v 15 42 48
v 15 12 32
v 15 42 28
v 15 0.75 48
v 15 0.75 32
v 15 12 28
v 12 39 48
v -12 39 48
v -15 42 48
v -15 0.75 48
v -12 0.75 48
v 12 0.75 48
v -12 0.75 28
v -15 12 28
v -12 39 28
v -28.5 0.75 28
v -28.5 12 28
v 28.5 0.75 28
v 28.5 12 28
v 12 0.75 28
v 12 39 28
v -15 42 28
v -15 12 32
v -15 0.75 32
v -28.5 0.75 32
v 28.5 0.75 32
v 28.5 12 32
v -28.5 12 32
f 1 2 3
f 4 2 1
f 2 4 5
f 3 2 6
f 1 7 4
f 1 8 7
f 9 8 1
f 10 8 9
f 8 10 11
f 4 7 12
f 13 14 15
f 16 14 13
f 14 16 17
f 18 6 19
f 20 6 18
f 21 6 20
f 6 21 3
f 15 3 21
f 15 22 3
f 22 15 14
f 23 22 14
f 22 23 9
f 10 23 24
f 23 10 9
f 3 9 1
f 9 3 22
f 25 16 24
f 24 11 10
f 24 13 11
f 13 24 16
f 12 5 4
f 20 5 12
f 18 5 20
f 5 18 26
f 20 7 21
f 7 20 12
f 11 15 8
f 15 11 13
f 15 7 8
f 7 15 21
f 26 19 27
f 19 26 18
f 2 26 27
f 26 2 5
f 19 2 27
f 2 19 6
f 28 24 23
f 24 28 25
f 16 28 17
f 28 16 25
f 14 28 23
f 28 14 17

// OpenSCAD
//%import("C:/Users/UO251069/Desktop/BattRack.stl");
difference(){
    translate([-15,0.75,28])
        cube([30,41.25,20]);
    translate([-12,0,27])
        cube([24,39,22]);
}

translate([15,0.75,28])
cube([13.5,11.25,4]);
translate([-28.5,0.75,28])
cube([13.5,11.25,4]);
